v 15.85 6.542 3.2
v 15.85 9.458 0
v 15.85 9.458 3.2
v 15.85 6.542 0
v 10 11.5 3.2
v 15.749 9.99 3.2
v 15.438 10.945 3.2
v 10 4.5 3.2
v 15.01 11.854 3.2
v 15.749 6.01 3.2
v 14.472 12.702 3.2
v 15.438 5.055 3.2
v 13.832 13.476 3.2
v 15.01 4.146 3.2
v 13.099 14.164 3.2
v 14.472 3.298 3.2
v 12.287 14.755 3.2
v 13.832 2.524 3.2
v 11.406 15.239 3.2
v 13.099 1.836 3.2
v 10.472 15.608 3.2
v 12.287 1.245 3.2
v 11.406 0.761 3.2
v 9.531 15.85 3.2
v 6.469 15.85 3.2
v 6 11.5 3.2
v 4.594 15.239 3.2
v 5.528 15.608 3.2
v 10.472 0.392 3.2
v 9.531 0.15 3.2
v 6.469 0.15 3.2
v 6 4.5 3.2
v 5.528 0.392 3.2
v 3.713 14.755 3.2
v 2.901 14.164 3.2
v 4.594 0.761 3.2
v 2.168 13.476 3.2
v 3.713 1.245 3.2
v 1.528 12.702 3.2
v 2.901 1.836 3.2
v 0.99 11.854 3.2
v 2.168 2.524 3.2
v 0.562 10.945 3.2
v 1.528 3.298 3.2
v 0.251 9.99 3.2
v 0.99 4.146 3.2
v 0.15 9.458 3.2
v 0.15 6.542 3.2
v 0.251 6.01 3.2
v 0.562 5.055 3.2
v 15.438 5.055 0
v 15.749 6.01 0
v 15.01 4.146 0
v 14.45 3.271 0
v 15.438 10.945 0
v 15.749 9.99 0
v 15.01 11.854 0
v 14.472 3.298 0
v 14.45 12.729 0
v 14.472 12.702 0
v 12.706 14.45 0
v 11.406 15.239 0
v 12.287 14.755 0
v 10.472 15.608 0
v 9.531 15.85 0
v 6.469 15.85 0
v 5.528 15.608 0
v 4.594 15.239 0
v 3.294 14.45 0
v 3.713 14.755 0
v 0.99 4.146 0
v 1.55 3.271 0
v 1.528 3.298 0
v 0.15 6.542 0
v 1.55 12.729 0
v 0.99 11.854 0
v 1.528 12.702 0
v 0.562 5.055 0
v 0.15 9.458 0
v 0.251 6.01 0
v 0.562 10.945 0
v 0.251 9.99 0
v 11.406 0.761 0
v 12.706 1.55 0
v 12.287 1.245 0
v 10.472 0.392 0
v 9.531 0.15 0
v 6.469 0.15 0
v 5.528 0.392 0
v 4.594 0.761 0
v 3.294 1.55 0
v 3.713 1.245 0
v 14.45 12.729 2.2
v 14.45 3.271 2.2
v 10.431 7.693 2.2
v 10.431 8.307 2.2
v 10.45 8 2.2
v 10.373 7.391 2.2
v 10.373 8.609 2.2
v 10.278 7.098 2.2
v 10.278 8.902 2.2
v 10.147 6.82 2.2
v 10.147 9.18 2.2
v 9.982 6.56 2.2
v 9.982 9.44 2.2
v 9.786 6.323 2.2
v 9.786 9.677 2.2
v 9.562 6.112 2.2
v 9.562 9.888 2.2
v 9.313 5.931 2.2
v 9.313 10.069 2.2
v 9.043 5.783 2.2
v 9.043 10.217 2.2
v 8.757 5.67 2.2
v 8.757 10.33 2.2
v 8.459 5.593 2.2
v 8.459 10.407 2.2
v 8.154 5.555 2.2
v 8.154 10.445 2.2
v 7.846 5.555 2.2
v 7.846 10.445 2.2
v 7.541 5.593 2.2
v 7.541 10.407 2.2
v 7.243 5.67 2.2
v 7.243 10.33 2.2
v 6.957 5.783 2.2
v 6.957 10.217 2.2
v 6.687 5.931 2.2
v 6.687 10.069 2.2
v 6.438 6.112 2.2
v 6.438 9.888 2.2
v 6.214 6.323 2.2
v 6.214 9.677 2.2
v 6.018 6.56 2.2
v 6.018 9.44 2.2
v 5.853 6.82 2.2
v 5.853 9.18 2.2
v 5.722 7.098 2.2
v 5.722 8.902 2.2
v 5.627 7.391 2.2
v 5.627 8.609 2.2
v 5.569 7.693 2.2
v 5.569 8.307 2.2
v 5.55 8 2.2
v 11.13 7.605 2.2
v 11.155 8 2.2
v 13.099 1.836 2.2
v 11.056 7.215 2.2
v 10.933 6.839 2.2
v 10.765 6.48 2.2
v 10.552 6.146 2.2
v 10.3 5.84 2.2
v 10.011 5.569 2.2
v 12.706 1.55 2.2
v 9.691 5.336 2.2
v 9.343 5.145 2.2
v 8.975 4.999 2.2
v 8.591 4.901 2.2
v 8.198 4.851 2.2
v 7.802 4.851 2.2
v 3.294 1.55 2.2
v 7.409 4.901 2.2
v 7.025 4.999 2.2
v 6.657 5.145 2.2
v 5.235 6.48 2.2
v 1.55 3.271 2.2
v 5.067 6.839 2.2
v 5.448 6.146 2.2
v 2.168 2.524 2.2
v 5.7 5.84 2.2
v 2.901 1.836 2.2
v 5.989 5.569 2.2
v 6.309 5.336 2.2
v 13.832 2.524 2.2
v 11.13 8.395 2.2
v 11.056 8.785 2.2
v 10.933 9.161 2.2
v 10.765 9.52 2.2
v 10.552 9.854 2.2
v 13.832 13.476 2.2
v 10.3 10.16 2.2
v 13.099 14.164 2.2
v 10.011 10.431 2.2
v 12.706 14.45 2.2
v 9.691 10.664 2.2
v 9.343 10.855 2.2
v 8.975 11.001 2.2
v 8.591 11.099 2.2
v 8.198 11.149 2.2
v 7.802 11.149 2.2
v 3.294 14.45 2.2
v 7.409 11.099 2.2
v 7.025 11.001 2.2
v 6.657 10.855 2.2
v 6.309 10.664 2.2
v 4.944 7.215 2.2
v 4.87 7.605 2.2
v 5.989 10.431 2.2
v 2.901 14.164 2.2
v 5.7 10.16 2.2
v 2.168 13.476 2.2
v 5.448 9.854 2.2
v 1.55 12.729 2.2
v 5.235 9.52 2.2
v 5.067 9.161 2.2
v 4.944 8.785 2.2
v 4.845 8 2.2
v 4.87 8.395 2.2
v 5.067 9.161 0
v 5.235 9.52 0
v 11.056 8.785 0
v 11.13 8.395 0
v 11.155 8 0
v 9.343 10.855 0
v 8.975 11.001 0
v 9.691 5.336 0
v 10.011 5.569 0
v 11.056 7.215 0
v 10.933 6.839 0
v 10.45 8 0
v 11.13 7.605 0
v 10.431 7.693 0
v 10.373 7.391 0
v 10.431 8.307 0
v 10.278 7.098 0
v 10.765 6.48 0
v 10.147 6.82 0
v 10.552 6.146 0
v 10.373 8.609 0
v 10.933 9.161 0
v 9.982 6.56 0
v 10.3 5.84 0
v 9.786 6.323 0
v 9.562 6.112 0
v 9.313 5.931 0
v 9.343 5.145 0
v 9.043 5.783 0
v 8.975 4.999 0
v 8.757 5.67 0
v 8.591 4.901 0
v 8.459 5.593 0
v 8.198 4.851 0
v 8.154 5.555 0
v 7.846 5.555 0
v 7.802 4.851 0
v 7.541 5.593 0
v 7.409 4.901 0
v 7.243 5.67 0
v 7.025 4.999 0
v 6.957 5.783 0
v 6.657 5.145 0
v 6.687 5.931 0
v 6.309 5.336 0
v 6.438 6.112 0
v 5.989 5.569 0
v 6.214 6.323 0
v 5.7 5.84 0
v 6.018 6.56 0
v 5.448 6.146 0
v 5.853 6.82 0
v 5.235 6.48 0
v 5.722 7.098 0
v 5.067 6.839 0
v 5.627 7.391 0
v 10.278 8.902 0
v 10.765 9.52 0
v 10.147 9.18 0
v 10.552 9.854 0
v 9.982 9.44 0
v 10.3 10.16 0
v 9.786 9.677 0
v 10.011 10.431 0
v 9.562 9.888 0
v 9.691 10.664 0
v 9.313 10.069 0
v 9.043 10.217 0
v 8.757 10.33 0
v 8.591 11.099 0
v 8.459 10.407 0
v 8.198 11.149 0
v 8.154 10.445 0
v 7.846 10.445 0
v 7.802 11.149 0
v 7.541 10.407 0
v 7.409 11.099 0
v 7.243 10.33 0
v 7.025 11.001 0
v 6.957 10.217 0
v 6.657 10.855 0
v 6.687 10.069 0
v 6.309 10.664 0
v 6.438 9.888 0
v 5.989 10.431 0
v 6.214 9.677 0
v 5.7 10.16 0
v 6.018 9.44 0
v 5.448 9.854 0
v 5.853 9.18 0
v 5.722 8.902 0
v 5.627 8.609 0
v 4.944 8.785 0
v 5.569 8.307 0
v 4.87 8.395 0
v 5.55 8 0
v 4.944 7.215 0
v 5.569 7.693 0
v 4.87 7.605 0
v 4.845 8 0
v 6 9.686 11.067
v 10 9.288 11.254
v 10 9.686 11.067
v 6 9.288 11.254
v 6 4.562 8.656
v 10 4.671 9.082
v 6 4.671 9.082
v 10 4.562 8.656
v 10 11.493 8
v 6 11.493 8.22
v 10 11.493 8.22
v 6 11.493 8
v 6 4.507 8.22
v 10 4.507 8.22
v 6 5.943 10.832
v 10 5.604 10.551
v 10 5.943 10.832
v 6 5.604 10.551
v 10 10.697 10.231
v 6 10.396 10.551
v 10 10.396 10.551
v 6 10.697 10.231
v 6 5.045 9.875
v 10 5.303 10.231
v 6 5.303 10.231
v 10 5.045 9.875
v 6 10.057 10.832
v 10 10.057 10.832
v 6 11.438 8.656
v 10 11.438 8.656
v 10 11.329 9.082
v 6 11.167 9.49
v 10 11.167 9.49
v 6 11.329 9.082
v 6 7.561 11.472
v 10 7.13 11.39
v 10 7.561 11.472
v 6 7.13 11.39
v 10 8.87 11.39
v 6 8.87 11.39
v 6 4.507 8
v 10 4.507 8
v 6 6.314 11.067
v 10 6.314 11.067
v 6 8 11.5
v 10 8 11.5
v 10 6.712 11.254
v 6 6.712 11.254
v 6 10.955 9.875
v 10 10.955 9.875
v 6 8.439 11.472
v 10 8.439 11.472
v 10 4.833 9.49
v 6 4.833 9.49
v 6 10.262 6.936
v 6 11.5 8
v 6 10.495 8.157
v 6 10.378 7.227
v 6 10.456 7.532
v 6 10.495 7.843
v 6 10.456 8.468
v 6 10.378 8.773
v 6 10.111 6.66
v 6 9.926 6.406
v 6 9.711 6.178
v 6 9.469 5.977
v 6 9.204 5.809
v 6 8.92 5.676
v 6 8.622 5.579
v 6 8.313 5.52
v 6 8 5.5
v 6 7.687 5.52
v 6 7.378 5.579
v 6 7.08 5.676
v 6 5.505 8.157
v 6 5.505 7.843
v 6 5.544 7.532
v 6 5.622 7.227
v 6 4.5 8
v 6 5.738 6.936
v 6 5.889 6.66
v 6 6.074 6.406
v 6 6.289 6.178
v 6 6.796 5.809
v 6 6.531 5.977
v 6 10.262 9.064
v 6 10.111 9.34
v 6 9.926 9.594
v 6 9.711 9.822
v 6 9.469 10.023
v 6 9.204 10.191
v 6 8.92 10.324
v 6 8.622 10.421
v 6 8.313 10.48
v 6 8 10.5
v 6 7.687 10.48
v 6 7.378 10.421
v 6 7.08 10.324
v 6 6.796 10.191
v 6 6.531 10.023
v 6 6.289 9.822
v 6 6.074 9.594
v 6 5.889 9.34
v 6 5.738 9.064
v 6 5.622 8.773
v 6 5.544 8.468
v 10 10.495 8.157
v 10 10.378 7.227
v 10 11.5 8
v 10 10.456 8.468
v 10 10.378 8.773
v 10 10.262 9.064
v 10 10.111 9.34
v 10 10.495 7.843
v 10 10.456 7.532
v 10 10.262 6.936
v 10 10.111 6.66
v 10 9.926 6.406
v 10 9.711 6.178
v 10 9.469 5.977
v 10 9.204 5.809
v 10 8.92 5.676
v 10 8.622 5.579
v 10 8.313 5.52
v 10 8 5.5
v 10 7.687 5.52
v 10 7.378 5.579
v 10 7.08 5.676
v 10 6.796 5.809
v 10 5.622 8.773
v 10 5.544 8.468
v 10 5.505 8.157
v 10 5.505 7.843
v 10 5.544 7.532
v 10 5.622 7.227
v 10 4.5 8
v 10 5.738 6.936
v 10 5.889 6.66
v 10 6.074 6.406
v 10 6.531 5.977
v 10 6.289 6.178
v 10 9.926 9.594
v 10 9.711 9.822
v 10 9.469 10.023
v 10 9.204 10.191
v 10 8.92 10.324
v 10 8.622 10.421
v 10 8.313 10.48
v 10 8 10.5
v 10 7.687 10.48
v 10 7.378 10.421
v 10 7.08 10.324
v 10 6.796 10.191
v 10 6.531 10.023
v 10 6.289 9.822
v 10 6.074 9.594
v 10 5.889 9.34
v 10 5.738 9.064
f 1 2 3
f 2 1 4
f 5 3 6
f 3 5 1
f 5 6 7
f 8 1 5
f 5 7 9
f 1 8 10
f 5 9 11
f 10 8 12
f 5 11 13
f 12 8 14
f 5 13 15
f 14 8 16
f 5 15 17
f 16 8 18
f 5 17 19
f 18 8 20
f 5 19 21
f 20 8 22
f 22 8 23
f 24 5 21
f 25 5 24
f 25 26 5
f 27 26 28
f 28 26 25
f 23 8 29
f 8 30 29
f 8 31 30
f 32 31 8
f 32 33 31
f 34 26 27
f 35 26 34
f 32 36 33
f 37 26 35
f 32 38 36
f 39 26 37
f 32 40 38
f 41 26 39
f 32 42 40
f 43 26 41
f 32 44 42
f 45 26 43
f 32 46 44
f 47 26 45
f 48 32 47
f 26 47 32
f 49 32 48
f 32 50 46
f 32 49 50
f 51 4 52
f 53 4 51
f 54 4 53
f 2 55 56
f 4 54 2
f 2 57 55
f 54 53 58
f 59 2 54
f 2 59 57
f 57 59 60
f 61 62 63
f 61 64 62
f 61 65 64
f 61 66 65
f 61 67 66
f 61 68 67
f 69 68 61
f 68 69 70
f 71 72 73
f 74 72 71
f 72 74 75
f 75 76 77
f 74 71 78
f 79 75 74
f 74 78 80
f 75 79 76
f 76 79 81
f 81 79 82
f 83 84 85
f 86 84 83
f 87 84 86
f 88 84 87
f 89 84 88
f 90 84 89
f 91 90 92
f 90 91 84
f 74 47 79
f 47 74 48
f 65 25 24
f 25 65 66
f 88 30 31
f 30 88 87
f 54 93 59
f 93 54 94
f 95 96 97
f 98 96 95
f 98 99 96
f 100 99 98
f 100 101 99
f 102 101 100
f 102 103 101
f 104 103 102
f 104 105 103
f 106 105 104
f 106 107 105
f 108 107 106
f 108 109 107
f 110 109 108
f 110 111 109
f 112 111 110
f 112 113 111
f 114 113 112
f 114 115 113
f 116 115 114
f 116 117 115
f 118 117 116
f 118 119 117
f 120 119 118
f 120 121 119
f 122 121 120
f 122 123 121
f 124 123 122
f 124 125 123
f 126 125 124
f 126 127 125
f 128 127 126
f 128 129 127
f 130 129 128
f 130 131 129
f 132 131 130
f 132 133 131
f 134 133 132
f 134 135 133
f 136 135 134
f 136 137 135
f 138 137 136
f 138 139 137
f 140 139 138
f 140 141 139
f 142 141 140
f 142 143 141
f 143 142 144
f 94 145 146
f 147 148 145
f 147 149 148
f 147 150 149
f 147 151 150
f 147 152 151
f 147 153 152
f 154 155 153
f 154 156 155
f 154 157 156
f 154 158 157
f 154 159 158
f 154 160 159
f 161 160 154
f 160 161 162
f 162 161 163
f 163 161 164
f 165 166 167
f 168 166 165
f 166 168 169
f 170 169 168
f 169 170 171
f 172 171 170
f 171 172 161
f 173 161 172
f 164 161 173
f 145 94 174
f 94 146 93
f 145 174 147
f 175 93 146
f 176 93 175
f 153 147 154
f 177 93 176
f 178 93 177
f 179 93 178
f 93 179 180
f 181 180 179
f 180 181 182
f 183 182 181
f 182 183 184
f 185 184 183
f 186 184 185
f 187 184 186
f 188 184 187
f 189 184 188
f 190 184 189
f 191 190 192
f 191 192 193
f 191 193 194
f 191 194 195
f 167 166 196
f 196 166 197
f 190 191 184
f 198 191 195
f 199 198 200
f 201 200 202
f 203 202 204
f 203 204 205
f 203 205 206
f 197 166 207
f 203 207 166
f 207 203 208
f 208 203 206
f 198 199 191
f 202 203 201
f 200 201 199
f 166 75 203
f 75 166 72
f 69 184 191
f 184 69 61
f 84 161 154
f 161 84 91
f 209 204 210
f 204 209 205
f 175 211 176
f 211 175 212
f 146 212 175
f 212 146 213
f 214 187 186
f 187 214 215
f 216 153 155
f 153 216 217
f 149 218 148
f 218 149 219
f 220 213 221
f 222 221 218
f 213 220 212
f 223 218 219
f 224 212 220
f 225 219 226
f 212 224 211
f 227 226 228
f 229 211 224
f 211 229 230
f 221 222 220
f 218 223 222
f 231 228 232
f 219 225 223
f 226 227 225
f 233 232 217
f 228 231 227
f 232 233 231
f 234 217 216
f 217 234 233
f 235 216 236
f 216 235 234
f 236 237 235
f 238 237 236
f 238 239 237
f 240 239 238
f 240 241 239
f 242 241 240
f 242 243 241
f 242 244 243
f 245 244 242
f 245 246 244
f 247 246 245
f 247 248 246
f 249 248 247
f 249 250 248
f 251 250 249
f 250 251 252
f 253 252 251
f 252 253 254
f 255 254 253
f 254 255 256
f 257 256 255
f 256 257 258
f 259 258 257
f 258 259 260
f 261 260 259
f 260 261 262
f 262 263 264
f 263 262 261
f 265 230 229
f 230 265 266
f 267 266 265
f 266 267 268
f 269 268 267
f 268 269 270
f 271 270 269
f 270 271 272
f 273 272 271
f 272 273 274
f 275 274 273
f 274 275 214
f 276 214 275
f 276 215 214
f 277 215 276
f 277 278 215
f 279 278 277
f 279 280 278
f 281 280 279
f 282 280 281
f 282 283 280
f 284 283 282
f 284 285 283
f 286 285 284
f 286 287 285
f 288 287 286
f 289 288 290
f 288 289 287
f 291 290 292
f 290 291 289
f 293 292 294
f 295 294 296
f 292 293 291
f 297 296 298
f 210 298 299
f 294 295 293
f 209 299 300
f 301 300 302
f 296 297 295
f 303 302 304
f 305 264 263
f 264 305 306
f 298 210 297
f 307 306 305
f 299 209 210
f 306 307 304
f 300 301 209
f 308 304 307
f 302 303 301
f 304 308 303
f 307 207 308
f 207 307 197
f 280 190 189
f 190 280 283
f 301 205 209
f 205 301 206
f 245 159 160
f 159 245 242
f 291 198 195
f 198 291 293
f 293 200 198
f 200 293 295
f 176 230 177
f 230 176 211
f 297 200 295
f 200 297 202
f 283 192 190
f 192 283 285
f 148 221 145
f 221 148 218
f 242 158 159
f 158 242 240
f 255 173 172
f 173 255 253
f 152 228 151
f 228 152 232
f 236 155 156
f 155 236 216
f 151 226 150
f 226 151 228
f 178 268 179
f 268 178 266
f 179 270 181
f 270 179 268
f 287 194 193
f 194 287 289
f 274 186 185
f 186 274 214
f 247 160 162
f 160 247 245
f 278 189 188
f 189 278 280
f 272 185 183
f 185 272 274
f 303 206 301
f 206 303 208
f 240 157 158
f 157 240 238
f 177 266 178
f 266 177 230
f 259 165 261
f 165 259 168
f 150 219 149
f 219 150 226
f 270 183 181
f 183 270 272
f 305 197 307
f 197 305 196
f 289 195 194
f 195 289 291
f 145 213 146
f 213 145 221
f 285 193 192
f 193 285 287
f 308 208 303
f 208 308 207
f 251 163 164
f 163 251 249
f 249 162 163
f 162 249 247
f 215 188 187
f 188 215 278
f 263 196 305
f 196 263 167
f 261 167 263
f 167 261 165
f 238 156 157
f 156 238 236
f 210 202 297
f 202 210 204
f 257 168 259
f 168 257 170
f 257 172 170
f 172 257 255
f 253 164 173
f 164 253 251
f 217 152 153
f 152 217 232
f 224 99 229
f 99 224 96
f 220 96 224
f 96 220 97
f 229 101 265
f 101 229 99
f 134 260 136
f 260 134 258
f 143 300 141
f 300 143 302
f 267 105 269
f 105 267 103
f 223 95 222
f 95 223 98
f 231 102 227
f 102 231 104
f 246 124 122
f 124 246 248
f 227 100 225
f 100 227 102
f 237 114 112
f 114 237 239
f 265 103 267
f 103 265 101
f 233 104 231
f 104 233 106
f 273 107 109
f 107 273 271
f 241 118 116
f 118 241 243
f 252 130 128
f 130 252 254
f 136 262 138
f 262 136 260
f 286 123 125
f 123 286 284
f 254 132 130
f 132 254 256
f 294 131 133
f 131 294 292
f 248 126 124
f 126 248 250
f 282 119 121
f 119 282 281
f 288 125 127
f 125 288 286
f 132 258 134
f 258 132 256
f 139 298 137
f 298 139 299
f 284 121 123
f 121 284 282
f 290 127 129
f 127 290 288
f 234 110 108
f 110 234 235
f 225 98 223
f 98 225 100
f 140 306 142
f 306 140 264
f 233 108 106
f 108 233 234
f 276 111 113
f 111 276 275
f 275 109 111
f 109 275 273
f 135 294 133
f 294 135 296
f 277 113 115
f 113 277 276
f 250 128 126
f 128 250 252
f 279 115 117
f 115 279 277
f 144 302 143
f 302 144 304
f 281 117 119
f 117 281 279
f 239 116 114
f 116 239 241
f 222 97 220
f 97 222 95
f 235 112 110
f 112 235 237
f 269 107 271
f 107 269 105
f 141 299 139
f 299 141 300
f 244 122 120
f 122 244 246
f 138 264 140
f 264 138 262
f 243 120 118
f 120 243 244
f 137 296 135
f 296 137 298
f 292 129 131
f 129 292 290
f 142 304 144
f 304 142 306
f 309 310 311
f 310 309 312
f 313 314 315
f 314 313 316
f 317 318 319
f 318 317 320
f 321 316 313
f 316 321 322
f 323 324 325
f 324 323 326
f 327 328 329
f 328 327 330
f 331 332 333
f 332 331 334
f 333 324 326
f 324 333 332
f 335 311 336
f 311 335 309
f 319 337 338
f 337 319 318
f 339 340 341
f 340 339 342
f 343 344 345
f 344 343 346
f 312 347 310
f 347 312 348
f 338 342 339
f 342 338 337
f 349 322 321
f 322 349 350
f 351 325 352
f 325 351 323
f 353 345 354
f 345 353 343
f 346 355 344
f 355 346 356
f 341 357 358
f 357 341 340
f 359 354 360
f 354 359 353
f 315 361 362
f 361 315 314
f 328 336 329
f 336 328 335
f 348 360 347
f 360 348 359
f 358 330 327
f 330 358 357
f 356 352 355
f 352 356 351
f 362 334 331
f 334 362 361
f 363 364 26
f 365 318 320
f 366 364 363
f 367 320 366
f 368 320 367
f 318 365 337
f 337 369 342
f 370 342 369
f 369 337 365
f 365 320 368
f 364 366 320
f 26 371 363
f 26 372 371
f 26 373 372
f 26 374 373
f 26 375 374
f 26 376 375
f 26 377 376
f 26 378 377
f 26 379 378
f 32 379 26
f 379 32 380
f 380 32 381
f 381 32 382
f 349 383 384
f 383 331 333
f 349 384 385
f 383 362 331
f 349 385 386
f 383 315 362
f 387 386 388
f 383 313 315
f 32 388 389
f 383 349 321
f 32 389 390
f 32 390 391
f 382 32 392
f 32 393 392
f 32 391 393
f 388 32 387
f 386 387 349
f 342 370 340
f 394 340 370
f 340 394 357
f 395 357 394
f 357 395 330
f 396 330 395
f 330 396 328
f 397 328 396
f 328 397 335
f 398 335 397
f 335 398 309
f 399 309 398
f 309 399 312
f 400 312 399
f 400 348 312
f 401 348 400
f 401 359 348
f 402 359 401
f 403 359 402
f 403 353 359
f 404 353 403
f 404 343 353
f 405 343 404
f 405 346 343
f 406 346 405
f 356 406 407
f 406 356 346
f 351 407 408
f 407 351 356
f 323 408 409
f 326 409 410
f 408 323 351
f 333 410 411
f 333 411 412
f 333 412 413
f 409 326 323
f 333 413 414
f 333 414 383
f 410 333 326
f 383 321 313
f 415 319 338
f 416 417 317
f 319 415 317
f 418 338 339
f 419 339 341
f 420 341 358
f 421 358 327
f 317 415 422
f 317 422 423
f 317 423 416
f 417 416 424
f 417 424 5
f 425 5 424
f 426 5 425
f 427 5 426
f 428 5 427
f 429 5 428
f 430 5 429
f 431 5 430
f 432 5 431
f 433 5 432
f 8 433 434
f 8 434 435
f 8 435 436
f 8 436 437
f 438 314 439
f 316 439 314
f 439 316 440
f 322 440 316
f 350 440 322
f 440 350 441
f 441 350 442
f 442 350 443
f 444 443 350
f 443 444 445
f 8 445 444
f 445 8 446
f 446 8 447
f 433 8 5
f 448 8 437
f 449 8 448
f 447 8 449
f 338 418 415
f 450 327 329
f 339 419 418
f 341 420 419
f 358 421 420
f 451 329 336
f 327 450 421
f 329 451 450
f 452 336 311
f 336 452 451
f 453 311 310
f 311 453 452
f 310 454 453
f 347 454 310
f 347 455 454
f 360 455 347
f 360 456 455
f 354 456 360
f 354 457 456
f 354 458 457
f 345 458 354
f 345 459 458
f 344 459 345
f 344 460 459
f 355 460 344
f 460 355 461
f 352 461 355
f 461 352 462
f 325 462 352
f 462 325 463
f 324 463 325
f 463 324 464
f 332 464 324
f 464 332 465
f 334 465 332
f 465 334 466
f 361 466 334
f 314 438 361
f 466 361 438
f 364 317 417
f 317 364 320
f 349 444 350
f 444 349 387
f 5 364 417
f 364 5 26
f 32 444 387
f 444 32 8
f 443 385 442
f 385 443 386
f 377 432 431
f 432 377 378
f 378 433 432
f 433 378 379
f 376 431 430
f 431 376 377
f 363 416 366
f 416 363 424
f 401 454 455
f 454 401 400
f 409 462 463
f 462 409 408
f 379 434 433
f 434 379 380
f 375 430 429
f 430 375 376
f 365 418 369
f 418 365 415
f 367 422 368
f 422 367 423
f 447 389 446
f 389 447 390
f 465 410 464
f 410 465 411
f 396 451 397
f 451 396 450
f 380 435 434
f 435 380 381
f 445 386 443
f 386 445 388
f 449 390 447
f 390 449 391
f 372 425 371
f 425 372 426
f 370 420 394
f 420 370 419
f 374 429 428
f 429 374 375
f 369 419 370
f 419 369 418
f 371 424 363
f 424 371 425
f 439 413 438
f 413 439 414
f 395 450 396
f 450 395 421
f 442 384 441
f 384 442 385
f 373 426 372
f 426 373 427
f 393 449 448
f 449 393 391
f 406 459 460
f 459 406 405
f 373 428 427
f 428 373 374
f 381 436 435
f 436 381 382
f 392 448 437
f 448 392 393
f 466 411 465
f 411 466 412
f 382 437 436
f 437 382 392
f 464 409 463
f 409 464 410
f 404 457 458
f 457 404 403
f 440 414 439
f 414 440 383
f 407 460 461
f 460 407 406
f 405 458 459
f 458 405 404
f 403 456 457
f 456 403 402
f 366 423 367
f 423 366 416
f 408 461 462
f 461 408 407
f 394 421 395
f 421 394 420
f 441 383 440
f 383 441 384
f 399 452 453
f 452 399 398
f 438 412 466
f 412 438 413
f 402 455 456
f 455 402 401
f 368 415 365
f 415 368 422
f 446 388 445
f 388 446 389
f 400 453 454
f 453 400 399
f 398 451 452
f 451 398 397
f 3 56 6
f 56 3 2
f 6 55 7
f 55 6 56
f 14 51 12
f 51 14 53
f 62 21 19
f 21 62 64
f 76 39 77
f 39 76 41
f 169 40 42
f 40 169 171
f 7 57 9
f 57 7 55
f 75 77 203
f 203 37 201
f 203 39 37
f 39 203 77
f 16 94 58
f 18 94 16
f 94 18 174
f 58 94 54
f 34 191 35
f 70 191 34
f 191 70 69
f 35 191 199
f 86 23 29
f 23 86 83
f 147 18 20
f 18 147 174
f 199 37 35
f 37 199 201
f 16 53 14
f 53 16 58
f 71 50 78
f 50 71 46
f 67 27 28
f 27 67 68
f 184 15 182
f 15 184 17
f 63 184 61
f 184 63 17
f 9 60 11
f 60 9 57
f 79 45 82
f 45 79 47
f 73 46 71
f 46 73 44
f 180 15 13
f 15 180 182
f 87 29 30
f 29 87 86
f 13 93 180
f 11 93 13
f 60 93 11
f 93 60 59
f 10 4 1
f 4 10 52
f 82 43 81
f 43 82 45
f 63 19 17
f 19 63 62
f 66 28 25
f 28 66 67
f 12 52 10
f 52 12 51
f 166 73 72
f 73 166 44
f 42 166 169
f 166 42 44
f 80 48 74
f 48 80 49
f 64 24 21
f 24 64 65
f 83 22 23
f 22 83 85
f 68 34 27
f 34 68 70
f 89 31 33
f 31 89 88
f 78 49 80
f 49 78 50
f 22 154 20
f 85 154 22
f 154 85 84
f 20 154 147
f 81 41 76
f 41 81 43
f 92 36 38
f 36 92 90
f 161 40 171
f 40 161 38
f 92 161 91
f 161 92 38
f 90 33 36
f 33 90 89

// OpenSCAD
/* LEGO Text Bricks
   by Lyl3

Create LEGO compatible bricks with text engraved on the sides

This code is published at:
https://www.thingiverse.com/thing:3867358
licensed under the Creative Commons - Attribution - Share Alike license (CC BY-SA 3.0)

V0.1 - working code
V0.2 - corrected brick dimensions to have 0.1 mm play on each side
       corrected stud height to be 1.8 mm instead of 1.6 mm
       corrected roof thickness to be 1.0 mm instead of 1.6 mm
V0.3 - cleaned the code
V0.4 - adjusted wall thickness from 1.6 mm to 1.4 mm
       fixed math for stud positions
       fixed math for play so that it's split between sides instead of on just one side
V0.5 - added tolerance parameter
V0.6 - corrected position of text to account for play and tolerance
V0.7 - set sane ranges for all parameters
V1.0 - adjusted diameter of under-stud from 6.51 to 6.41
       adjusted width of walls from 1.4 mm to 1.5 mm
       ready for release
V1.1 - changed boolean parameters to yes/no parameters to make them Thingiverse Customizer-friendly
V1.2 - allowed $fn to be adjusted from previous hard-coded value of 100
V1.3 - allow text Z shift to be negative 
V1.4 - added parameter for spacing between letters
V1.5 - moved studs down 0.00001 mm so that the brick and studs are a single mesh
V1.6 - bug fix: parameter for spacing between letters now applied to text on back,left and right sides
     - allowed LEGO dimensions to be overridden
V1.7 - modified font selection method to work around bug that Thingiverse customizer recently introduced
         that prevents direct selection of fonts with a style specified
       added capability to select any font
V1.8 - added capability to have raised text instead of embossed text

*/

/*
   Set default brick to be #2456 6x2 
*/
/* [Brick Parameters] */

// Brick length (specified in number of studs).
brickLength = 2; // [1:1:48]

// Brick width (specified in number of studs).
brickWidth = 1;  // [1:1:48]

// Brick height (specified in LEGO height units: 3 is normal brick height, 1 is plate height).
brickHeight = 1; // [1:1:18]

// Studs on top of the brick?
withStuds = "yes"; // [yes,no]
createStuds = (withStuds=="yes") ? true : false;

// Under-studs on underneath of skinny bricks? Skinny bricks that are only one unit wide have smaller solid cylinders (under-studs) underneath instead of the usual hollow cylinders. These have a tiny footprint and may not stick to the build-plate, so you may want to avoid printing them.
withUnderStuds = "yes"; // [yes,no]
createUnderStuds = (withUnderStuds=="yes") ? true : false;


/* [Text Parameters] */

// Raised text instead of embossed text?
raisedText = "no"; // [yes,no]
textRaised = (raisedText=="yes") ? true : false;

frontText = "";
frontTextScale = 1.0; // [0:0.01:1]

backText = "";
backTextScale = 1.0; // [0:0.01:1]

leftText = ""; 
leftTextScale = 1.0; // [0:0.01:1]

rightText = ""; 
rightTextScale = 1.0; // [0:0.01:1]

/* [Advanced parameters] */

// Tolerance to account for 3D printing inaccuracies (mm). This decreases the sizes of all vertical surfaces (brick walls, studs, under-tubes, and under-studs) to provide a better fit. It is equivalent to a negative horizontal expansion setting in the Cura slicer. You might want to decrease this for bricks that are only 1 unit wide without under-studs as they will be naturally looser fitting than other bricks. The best setting is printer/filament dependent so I've set the default for my printer on the assumption that it's average. 
tolerance = 0.05; // [0:0.01:0.1]

// Some suitable fonts
//fontName = "Arial Black:style=Regular";    // Not available on Thingiverse customizer
//fontName = "Biryani:style=Black";          // Has short numbers
//fontName = "Heebo:style=Black";            // Has tight kerning
//fontName = "Maven Pro:style=Black";        // Has tight spacing on "g"
//fontName = "Nunito Sans:style=Black";      // Has tight kerning
//fontName = "Orbitron:style=Black";         // Has blocky letters
//fontName = "Palanquin Dark:style=Bold";    // Has descended numbers
//fontName = "Raleway:style=Black";          // Has descended numbers
//fontName = "Roboto:style=Black";           // No issues
//fontName = "Yantramanav:style=Black";      // No issues


// Choose from a small selection of similar fonts that should work well in this application (NOTE: Arial is not available on Thingiverse).
fontName = 9; // [2:Biryani Black, 3:Heebo Black, 4:Maven Pro Black, 5:Nunito Sans Black, 6:Orbitron Black, 7:Palanquin Dark Bold, 8:Raleway Black, 9:Roboto Black, 10:Yantramanav Black, 0:other, 1:Arial Black]

// If "other" is selected above, you can specify any font available from the Google fonts repository . See https://fonts.google.com/ for available fonts. For example, specify "Overpass Mono:style=Bold" to allow entering some special symbols like heart, club, etc.
otherFont = "Overpass Mono";

// The base size of the text on all sides (can be scaled down in the text parameters section).
textSize = 5.5; // [1:0.1:10]

// Spacing between letters. (ratio: 1 is normal spacing of the font) It's better to have this a little higher for this application.
letterSpacing = 1.05;  // [0.9:0.01:2.0]

// How much to shift the text in the Z dimension (mm).
textZShift = 2.0;         // [-5:0.1:8]

// The depth of the text (mm). You should probably decrease this from the default of 0.8 if you plan on scaling the model up in your slicer.
textDepth = 0.8;  // [0.2:0.01:1.0]

// Resolution of circles. 50 fragments is more than enough for such a small cylinders unless the model will be later scaled up
numberFragments = 50;                 // [6:1:100] 
$fn = numberFragments;

/* [Advanced parameters: Override LEGO dimensions] */

// X and Y dimension of one brick unit (mm)
UNIT_LENGTH = 8; // [0.8:0.01:80]

// plate height (a standard brick is 3 times this height) (mm)
PLATE_HEIGHT = 3.2; // [0.32:0.01:32]

// thickness of brick roof (mm)
ROOF_THICKNESS = 1; // [0.1:0.01:10]

// thickness of brick outer wall as in the original 1.5 mm wall without nubs (mm)
WALL_THICKNESS = 1.5; // [0.15:0.01:15]

// diameter of the studs (solid cylinders) on top of a brick (mm)
STUD_DIAMETER = 4.8*1.05; // [0.48:0.01:48]

// height of the studs (solid cylinders) on top of a brick (mm)
STUD_HEIGHT = 1.8; // [0.18:0.01:18]

// outer diameter of the under-tubes (hollow cylinders) on the underside of bricks with length > 1 and width > 1 (mm)
UNDERTUBE_OUTER_DIAMETER = 6.41; // [0.64:0.01:64.1]

// inner diameter of the under-tubes (hollow cylinders) on the underside of bricks with length > 1 and width > 1 (mm)
UNDERTUBE_INNER_DIAMETER = 4.8; // [0.48:0.01:48]

// diameter of the under-studs (solid cylinders) on the underside of bricks with length = 1 or width = 1 (mm)
UNDERSTUD_DIAMETER = 1.6; // [0.16:0.01:16]

// the necessary play between bricks so that they fit together
PLAY = 0.2; // [0.02:0.01:2]

/* [Hidden] */
fudge = 0.01;               // Amount to expand some dimensions to ensure manifold model

// This convoluted way of selecting the font from an array was a requirement introduced by a change
// on the Thingiverse customizer that broke the ability to directly select fonts with a style specified.
// This issue was first noticed 2010-02-26 and probably happened within the two months prior to that date.
fontNames = ["other", "Arial Black:style=Regular", "Biryani:style=Black", "Heebo:style=Black", "Maven Pro:style=Black", "Nunito Sans:style=Black", "Orbitron:style=Black", "Palanquin Dark:style=Bold", "Raleway:style=Black", "Roboto:style=Black", "Yantramanav:style=Black"];

selectedFont = (fontName==0) ? otherFont : fontNames[fontName];

textBack = textRaised ? 0 : textDepth;



difference(){
    union(){

        brick(2,2,1, false, true);
        translate([8-2,8,8]) rotate([0,90,0]) difference(){
            union(){
                cylinder(d=7,h=4);
                translate([0,-3.5,0]) cube([5,7,4]);
            }
            cylinder(d=5,h=4);
            

        }
    }
    translate([8,8,0]) difference(){
        cylinder(d=12*2,h=3.2);
        cylinder(d=8*2,h=3.2);
    }
}



/*
   Module to make a simple rectangular LEGO compatible brick
   Makes a #3001 4x2 brick by default
*/
module brick(length=4, width=2, height=3, createStuds=true, createUnderStuds=true) {

  // The brick
  translate([PLAY/2+tolerance, PLAY/2+tolerance, 0])
    difference() {
      cube([length*UNIT_LENGTH-PLAY-2*tolerance, width*UNIT_LENGTH-PLAY-2*tolerance, height*PLATE_HEIGHT]);
      translate([WALL_THICKNESS-2*tolerance, WALL_THICKNESS-2*tolerance, -ROOF_THICKNESS])
        cube([length*UNIT_LENGTH-2*WALL_THICKNESS-PLAY+2*tolerance, width*UNIT_LENGTH-2*WALL_THICKNESS-PLAY+2*tolerance, height*PLATE_HEIGHT]);
    }

  // The studs
  if(createStuds) {
    translate([0,0, height*PLATE_HEIGHT-0.00001])
      for (y = [0:width-1]) {
        for (x = [0:length-1]) {
          translate([(x+0.5)*UNIT_LENGTH, (y+0.5)*UNIT_LENGTH, 0])
            cylinder(h=STUD_HEIGHT, d=STUD_DIAMETER-2*tolerance);
        }
      }
  }

  // The under-tubes (hollow cylinders)
  if (width > 1 && length > 1) {
    for (y = [1:width-1]) {
      for (x = [1:length-1]) {
        difference() {
		  translate([x*UNIT_LENGTH, y*UNIT_LENGTH, 0])
			cylinder(h=height*PLATE_HEIGHT-ROOF_THICKNESS+fudge, d = UNDERTUBE_OUTER_DIAMETER-2*tolerance);
		  translate([x*UNIT_LENGTH, y*UNIT_LENGTH, -fudge])
			cylinder(h=height*PLATE_HEIGHT-ROOF_THICKNESS+fudge, d = UNDERTUBE_INNER_DIAMETER+2*tolerance);				
		}
	  }
	}
  }

  // The under-studs (smaller solid cylinders) along the length
  if (width == 1 && length > 1 && createUnderStuds) {	
	for (x = [1:length-1]) {
	  translate([x*UNIT_LENGTH, 0.5*UNIT_LENGTH, 0])
	    cylinder(h=height*PLATE_HEIGHT-WALL_THICKNESS, d=UNDERSTUD_DIAMETER-2*tolerance);
	}
  }

  // The under-studs (smaller solid cylinders) along the width
  if (length == 1 && width > 1 && createUnderStuds) {	
	for (y = [1:width-1]) {
	  translate([0.5*UNIT_LENGTH, y*UNIT_LENGTH, 0])
		cylinder(h=height*PLATE_HEIGHT-WALL_THICKNESS, d=UNDERSTUD_DIAMETER-2*tolerance);
	}
  }

}

module makeText () {
  translate([0, -brickWidth/2*UNIT_LENGTH+textBack+PLAY/2+tolerance, textZShift]) rotate([90, 0, 0])
    linear_extrude(textDepth+fudge) text(frontText, font=selectedFont, size=textSize*frontTextScale, halign="center", spacing=letterSpacing);
  translate([0, brickWidth/2*UNIT_LENGTH-textBack-PLAY/2-tolerance, textZShift]) rotate([90, 0, 180])
    linear_extrude(textDepth+fudge) text(backText, font=selectedFont, size=textSize*backTextScale, halign="center", spacing=letterSpacing);
  translate([-brickLength/2*UNIT_LENGTH+textBack+PLAY/2+tolerance, 0, textZShift]) rotate([90, 0, 270])
    linear_extrude(textDepth+fudge) text(leftText, font=selectedFont, size=textSize*leftTextScale, halign="center", spacing=letterSpacing);
  translate([brickLength/2*UNIT_LENGTH-textBack-PLAY/2-tolerance, 0, textZShift]) rotate([90, 0, 90])
    linear_extrude(textDepth+fudge) text(rightText, font=selectedFont, size=textSize*rightTextScale, halign="center", spacing=letterSpacing);
}
	
